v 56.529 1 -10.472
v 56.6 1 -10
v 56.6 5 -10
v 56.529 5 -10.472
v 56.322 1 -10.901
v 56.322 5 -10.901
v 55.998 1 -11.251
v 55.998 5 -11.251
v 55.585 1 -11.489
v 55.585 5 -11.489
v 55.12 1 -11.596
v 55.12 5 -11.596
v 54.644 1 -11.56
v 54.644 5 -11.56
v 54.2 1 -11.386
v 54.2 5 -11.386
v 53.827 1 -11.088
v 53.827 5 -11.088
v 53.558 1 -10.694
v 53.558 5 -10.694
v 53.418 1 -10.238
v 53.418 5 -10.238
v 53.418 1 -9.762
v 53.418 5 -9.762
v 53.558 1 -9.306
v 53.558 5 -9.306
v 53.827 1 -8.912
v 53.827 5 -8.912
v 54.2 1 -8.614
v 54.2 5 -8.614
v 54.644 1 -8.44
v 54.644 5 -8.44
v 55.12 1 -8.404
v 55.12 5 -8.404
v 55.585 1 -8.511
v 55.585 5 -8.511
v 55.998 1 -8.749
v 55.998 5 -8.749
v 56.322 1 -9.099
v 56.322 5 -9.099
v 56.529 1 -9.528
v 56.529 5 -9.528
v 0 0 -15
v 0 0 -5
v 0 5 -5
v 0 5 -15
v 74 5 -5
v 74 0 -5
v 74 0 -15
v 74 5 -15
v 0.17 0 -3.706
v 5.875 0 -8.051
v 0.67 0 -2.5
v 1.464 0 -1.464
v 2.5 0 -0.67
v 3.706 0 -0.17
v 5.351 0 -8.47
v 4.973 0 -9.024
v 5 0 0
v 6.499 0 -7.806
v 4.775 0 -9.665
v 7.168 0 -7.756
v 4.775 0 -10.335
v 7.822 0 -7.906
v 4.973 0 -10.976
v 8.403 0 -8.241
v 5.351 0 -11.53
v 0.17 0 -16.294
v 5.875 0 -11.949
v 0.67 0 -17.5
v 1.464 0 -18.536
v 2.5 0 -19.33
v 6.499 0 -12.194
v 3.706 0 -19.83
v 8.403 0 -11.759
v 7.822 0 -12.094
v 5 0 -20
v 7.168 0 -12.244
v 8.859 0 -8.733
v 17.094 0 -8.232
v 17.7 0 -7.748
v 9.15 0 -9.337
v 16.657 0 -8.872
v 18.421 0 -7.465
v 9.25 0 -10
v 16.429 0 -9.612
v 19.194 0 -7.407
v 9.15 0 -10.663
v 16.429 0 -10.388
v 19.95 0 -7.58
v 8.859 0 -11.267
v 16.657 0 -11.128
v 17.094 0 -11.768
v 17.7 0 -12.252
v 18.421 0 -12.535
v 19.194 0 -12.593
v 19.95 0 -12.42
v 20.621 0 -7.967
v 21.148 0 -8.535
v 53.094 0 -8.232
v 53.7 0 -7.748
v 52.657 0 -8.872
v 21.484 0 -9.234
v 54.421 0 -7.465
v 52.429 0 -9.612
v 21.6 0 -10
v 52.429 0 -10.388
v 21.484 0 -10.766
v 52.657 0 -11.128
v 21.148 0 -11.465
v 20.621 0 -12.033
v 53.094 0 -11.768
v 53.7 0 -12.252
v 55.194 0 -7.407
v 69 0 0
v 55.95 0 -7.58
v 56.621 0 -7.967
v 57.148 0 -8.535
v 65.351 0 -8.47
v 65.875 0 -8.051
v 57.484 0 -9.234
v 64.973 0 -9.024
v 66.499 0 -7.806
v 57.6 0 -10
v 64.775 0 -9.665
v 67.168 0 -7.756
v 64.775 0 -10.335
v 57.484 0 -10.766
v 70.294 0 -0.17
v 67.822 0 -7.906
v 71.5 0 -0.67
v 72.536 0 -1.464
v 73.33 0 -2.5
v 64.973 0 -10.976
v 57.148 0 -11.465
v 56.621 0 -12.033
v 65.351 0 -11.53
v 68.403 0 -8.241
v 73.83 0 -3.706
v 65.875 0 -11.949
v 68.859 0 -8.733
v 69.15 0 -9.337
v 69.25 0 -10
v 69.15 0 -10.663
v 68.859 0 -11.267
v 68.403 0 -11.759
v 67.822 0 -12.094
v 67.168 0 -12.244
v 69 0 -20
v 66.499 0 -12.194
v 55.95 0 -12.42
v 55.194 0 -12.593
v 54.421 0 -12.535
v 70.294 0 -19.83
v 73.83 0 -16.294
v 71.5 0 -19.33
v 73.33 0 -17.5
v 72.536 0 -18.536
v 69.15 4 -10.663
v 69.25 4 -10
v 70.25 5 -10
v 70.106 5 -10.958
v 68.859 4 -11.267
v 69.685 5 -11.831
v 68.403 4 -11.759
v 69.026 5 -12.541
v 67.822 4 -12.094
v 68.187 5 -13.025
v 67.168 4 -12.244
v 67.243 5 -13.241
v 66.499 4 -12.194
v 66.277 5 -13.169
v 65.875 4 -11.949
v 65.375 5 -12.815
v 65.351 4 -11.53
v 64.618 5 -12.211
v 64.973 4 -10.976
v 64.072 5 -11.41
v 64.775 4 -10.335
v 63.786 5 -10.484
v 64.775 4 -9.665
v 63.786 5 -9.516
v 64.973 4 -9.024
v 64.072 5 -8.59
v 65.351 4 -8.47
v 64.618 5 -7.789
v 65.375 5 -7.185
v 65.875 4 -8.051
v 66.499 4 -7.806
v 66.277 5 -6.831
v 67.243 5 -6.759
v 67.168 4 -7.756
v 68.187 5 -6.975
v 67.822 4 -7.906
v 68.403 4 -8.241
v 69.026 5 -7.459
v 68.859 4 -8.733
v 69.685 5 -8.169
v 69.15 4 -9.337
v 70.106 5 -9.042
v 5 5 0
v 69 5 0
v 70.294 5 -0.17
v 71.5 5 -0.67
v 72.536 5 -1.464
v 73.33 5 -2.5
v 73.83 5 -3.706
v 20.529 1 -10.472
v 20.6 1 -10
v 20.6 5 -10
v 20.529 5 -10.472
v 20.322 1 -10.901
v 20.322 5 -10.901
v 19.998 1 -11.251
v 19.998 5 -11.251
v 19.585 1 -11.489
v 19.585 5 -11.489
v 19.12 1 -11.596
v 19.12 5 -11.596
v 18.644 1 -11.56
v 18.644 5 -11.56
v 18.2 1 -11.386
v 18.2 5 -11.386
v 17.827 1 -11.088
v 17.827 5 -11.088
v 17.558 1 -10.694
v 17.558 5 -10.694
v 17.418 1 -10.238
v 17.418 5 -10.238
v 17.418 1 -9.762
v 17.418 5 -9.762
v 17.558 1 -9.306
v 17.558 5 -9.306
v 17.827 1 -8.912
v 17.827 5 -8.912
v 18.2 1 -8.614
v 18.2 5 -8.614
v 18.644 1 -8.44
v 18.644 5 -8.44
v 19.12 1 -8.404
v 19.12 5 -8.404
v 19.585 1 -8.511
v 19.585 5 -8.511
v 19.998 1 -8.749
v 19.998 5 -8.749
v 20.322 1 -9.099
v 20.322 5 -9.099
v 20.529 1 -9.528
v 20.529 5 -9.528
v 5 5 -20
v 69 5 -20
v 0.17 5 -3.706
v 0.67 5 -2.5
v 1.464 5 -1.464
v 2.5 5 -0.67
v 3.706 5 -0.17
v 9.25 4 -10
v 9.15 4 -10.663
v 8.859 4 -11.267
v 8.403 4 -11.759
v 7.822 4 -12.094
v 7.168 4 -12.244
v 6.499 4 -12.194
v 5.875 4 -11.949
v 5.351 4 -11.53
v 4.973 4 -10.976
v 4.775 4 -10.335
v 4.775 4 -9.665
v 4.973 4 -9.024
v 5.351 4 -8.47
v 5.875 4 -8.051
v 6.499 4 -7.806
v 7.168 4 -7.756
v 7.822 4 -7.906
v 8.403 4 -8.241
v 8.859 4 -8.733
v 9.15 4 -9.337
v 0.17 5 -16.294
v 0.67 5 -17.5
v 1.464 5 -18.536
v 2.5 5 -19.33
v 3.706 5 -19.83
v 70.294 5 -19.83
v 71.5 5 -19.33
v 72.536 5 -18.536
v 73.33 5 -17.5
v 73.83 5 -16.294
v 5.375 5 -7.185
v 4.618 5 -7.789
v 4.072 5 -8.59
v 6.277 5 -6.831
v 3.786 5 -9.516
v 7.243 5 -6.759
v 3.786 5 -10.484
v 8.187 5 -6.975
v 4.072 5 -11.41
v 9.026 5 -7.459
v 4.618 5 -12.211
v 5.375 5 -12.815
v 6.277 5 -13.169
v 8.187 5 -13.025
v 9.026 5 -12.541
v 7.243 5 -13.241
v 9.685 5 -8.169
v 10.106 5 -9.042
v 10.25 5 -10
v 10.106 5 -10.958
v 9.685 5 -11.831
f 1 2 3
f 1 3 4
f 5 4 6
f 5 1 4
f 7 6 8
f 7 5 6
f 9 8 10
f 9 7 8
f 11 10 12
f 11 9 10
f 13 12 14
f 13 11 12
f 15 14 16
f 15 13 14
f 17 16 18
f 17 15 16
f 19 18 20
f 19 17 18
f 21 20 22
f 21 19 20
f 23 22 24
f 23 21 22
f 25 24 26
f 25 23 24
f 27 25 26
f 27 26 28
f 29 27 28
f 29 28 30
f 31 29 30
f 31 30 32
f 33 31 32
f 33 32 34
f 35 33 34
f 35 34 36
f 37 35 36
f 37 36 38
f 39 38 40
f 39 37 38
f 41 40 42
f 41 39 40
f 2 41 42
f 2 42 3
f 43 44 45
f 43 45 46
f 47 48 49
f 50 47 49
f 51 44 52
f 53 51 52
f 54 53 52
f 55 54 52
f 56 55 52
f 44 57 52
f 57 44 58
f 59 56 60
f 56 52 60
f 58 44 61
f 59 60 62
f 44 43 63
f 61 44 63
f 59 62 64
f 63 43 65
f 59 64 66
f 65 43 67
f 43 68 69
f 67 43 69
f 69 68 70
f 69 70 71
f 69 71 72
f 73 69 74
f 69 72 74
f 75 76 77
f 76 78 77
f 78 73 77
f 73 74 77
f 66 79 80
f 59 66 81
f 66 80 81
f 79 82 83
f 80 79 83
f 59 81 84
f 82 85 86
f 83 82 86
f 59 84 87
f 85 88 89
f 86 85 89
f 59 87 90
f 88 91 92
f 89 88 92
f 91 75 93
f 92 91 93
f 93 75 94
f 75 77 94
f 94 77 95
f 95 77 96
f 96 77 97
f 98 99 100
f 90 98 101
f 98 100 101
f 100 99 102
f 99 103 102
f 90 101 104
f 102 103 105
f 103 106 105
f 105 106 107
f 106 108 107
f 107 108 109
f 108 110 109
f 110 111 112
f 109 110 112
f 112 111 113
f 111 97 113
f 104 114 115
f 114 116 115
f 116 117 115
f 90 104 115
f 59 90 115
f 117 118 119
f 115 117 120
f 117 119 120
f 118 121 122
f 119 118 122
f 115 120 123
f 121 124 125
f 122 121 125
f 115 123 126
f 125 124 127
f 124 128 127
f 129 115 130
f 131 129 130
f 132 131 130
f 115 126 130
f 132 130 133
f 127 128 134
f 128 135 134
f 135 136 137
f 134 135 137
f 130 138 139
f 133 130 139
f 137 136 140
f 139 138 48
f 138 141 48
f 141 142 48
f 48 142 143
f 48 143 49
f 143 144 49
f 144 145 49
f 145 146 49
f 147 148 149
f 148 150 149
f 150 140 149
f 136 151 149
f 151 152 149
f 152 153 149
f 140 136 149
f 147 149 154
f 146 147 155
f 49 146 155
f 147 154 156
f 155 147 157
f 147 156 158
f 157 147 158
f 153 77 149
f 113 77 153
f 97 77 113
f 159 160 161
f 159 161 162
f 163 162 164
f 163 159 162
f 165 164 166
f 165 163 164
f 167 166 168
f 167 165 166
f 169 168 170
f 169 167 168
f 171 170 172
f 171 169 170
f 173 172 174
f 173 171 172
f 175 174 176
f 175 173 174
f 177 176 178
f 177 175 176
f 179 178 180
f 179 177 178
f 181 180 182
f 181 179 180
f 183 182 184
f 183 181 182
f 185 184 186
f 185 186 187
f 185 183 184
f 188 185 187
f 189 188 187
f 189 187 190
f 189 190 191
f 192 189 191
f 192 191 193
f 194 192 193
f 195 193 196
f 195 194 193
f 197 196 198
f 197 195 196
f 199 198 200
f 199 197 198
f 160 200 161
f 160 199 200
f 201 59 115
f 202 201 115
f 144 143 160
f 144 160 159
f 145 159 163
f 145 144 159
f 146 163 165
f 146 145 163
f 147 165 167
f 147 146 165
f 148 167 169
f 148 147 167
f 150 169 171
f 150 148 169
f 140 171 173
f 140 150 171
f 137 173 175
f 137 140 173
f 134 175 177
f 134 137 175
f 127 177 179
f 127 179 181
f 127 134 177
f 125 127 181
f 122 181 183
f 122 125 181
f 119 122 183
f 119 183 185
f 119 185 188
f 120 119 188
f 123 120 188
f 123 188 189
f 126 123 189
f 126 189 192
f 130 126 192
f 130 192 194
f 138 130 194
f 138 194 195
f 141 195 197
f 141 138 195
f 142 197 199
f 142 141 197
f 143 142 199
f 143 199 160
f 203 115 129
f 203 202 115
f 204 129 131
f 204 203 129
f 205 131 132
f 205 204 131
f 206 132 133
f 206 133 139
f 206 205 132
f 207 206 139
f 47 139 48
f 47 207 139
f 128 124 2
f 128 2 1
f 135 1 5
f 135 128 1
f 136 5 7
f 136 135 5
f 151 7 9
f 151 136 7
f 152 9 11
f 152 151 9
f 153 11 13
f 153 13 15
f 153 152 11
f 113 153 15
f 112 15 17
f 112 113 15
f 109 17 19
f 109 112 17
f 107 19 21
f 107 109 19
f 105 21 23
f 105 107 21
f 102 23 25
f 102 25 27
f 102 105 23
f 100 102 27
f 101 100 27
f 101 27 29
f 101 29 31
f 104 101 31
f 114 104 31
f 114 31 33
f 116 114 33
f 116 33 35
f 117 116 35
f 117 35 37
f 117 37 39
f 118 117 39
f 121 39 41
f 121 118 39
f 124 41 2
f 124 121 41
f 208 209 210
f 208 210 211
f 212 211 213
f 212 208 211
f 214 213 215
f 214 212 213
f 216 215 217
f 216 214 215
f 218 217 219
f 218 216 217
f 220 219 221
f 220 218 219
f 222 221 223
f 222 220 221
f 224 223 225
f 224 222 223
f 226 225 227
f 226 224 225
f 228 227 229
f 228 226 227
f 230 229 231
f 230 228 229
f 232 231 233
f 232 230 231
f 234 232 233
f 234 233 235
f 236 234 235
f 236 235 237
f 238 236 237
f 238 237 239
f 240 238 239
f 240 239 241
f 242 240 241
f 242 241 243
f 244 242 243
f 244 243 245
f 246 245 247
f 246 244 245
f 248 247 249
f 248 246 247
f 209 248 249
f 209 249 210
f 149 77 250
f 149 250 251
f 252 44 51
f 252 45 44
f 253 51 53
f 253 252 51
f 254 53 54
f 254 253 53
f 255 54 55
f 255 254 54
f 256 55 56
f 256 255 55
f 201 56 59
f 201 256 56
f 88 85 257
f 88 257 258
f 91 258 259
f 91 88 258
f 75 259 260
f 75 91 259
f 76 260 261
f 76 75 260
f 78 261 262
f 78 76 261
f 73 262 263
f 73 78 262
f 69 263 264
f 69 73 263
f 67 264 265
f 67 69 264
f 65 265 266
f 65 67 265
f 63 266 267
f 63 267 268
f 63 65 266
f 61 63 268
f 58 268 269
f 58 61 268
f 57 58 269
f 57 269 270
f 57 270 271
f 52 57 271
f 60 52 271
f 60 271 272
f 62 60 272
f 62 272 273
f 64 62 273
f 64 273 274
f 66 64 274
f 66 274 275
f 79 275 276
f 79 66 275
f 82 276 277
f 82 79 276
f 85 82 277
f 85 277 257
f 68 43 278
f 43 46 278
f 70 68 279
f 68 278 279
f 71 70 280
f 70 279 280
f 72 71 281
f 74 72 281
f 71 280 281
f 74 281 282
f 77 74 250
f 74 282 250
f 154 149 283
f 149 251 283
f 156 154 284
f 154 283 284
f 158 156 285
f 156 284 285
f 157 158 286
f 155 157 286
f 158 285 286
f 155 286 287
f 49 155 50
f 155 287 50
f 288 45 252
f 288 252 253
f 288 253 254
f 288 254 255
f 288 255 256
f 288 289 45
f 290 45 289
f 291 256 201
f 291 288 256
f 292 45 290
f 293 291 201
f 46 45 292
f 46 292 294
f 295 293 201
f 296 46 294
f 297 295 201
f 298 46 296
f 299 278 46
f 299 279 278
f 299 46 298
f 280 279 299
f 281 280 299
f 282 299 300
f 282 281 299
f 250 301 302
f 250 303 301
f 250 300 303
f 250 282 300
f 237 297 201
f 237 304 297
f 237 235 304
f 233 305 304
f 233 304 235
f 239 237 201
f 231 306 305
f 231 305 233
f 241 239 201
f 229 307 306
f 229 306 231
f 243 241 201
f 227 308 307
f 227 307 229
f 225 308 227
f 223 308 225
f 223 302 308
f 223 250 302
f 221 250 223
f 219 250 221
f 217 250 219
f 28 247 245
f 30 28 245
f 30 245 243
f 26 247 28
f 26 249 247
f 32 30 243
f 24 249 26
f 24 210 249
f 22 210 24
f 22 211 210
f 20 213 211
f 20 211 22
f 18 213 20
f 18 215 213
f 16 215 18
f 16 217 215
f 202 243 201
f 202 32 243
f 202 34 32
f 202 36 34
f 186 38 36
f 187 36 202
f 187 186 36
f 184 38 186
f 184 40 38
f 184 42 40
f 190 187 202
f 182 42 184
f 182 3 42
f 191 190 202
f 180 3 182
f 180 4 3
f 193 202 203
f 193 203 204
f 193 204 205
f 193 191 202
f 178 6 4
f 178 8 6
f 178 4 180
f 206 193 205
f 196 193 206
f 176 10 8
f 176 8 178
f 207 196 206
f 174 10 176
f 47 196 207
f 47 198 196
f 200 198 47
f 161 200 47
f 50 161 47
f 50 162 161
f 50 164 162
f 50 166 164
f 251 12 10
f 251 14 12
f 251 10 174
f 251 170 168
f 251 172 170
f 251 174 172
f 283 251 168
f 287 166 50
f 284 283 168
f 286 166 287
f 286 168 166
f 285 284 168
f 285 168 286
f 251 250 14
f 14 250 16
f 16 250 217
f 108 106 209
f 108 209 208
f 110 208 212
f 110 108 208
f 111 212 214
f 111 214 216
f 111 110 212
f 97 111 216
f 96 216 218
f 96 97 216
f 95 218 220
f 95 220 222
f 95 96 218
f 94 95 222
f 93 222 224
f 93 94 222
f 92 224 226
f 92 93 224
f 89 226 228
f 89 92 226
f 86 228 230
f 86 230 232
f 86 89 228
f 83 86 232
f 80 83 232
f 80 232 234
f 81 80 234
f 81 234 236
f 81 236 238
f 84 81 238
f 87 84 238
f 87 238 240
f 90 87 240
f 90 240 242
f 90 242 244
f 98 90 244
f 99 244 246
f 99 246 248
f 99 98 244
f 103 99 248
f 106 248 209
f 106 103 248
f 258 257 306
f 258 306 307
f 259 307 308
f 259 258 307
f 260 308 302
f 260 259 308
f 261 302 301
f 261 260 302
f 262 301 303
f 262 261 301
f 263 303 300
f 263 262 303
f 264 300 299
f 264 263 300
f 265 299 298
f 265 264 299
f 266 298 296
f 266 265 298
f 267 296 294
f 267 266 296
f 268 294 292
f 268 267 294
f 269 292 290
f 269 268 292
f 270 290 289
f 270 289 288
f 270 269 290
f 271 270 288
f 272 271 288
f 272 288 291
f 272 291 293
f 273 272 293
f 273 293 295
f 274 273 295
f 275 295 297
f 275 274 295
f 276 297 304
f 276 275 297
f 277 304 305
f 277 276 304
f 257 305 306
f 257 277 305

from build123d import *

# Parameters (mm, degrees)
SKETCH_1_W      = 74
SKETCH_1_H      = 20
SKETCH_1_R      = 1.6
SKETCH_1_R_2    = 2.25
EXTRUDE_1_DEPTH = 5
FILLET_2_R      = 5
CHAMFER_1_SIZE  = 1
CHAMFER_2_SIZE  = 1


with BuildPart() as part:
    # Эскиз1 → Бобышка-Вытянуть1 (new body)
    with BuildSketch(Plane(origin=(0, 0, 0), x_dir=(1, 0, 0), z_dir=(0, 1, 0))):
        with Locations((37, 10)):
            Rectangle(SKETCH_1_W, SKETCH_1_H)
        with Locations((19, 10)):
            Circle(SKETCH_1_R, mode=Mode.SUBTRACT)
        with Locations((55, 10)):
            Circle(SKETCH_1_R, mode=Mode.SUBTRACT)
        with Locations((7, 10)):
            Circle(SKETCH_1_R_2, mode=Mode.SUBTRACT)
        with Locations((67, 10)):
            Circle(SKETCH_1_R_2, mode=Mode.SUBTRACT)
    extrude(amount=EXTRUDE_1_DEPTH)

    # Скругление2
    fillet_2_edges = [part.edges().sort_by_distance(p)[0] for p in [
        (0, 2.5, -20),
        (74, 2.5, -20),
        (74, 2.5, 0),
        (0, 2.5, 0),
    ]]
    fillet(fillet_2_edges, radius=FILLET_2_R)

    # Фаска1
    chamfer_1_edges = [part.edges().sort_by_distance(p)[0] for p in [
        (4.75, 5, -10),
        (64.75, 5, -10),
    ]]
    chamfer(chamfer_1_edges, length=CHAMFER_1_SIZE)

    # Фаска2
    chamfer_2_edges = [part.edges().sort_by_distance(p)[0] for p in [
        (17.4, 0, -10),
        (53.4, 0, -10),
    ]]
    chamfer(chamfer_2_edges, length=CHAMFER_2_SIZE)


solid = part.part
